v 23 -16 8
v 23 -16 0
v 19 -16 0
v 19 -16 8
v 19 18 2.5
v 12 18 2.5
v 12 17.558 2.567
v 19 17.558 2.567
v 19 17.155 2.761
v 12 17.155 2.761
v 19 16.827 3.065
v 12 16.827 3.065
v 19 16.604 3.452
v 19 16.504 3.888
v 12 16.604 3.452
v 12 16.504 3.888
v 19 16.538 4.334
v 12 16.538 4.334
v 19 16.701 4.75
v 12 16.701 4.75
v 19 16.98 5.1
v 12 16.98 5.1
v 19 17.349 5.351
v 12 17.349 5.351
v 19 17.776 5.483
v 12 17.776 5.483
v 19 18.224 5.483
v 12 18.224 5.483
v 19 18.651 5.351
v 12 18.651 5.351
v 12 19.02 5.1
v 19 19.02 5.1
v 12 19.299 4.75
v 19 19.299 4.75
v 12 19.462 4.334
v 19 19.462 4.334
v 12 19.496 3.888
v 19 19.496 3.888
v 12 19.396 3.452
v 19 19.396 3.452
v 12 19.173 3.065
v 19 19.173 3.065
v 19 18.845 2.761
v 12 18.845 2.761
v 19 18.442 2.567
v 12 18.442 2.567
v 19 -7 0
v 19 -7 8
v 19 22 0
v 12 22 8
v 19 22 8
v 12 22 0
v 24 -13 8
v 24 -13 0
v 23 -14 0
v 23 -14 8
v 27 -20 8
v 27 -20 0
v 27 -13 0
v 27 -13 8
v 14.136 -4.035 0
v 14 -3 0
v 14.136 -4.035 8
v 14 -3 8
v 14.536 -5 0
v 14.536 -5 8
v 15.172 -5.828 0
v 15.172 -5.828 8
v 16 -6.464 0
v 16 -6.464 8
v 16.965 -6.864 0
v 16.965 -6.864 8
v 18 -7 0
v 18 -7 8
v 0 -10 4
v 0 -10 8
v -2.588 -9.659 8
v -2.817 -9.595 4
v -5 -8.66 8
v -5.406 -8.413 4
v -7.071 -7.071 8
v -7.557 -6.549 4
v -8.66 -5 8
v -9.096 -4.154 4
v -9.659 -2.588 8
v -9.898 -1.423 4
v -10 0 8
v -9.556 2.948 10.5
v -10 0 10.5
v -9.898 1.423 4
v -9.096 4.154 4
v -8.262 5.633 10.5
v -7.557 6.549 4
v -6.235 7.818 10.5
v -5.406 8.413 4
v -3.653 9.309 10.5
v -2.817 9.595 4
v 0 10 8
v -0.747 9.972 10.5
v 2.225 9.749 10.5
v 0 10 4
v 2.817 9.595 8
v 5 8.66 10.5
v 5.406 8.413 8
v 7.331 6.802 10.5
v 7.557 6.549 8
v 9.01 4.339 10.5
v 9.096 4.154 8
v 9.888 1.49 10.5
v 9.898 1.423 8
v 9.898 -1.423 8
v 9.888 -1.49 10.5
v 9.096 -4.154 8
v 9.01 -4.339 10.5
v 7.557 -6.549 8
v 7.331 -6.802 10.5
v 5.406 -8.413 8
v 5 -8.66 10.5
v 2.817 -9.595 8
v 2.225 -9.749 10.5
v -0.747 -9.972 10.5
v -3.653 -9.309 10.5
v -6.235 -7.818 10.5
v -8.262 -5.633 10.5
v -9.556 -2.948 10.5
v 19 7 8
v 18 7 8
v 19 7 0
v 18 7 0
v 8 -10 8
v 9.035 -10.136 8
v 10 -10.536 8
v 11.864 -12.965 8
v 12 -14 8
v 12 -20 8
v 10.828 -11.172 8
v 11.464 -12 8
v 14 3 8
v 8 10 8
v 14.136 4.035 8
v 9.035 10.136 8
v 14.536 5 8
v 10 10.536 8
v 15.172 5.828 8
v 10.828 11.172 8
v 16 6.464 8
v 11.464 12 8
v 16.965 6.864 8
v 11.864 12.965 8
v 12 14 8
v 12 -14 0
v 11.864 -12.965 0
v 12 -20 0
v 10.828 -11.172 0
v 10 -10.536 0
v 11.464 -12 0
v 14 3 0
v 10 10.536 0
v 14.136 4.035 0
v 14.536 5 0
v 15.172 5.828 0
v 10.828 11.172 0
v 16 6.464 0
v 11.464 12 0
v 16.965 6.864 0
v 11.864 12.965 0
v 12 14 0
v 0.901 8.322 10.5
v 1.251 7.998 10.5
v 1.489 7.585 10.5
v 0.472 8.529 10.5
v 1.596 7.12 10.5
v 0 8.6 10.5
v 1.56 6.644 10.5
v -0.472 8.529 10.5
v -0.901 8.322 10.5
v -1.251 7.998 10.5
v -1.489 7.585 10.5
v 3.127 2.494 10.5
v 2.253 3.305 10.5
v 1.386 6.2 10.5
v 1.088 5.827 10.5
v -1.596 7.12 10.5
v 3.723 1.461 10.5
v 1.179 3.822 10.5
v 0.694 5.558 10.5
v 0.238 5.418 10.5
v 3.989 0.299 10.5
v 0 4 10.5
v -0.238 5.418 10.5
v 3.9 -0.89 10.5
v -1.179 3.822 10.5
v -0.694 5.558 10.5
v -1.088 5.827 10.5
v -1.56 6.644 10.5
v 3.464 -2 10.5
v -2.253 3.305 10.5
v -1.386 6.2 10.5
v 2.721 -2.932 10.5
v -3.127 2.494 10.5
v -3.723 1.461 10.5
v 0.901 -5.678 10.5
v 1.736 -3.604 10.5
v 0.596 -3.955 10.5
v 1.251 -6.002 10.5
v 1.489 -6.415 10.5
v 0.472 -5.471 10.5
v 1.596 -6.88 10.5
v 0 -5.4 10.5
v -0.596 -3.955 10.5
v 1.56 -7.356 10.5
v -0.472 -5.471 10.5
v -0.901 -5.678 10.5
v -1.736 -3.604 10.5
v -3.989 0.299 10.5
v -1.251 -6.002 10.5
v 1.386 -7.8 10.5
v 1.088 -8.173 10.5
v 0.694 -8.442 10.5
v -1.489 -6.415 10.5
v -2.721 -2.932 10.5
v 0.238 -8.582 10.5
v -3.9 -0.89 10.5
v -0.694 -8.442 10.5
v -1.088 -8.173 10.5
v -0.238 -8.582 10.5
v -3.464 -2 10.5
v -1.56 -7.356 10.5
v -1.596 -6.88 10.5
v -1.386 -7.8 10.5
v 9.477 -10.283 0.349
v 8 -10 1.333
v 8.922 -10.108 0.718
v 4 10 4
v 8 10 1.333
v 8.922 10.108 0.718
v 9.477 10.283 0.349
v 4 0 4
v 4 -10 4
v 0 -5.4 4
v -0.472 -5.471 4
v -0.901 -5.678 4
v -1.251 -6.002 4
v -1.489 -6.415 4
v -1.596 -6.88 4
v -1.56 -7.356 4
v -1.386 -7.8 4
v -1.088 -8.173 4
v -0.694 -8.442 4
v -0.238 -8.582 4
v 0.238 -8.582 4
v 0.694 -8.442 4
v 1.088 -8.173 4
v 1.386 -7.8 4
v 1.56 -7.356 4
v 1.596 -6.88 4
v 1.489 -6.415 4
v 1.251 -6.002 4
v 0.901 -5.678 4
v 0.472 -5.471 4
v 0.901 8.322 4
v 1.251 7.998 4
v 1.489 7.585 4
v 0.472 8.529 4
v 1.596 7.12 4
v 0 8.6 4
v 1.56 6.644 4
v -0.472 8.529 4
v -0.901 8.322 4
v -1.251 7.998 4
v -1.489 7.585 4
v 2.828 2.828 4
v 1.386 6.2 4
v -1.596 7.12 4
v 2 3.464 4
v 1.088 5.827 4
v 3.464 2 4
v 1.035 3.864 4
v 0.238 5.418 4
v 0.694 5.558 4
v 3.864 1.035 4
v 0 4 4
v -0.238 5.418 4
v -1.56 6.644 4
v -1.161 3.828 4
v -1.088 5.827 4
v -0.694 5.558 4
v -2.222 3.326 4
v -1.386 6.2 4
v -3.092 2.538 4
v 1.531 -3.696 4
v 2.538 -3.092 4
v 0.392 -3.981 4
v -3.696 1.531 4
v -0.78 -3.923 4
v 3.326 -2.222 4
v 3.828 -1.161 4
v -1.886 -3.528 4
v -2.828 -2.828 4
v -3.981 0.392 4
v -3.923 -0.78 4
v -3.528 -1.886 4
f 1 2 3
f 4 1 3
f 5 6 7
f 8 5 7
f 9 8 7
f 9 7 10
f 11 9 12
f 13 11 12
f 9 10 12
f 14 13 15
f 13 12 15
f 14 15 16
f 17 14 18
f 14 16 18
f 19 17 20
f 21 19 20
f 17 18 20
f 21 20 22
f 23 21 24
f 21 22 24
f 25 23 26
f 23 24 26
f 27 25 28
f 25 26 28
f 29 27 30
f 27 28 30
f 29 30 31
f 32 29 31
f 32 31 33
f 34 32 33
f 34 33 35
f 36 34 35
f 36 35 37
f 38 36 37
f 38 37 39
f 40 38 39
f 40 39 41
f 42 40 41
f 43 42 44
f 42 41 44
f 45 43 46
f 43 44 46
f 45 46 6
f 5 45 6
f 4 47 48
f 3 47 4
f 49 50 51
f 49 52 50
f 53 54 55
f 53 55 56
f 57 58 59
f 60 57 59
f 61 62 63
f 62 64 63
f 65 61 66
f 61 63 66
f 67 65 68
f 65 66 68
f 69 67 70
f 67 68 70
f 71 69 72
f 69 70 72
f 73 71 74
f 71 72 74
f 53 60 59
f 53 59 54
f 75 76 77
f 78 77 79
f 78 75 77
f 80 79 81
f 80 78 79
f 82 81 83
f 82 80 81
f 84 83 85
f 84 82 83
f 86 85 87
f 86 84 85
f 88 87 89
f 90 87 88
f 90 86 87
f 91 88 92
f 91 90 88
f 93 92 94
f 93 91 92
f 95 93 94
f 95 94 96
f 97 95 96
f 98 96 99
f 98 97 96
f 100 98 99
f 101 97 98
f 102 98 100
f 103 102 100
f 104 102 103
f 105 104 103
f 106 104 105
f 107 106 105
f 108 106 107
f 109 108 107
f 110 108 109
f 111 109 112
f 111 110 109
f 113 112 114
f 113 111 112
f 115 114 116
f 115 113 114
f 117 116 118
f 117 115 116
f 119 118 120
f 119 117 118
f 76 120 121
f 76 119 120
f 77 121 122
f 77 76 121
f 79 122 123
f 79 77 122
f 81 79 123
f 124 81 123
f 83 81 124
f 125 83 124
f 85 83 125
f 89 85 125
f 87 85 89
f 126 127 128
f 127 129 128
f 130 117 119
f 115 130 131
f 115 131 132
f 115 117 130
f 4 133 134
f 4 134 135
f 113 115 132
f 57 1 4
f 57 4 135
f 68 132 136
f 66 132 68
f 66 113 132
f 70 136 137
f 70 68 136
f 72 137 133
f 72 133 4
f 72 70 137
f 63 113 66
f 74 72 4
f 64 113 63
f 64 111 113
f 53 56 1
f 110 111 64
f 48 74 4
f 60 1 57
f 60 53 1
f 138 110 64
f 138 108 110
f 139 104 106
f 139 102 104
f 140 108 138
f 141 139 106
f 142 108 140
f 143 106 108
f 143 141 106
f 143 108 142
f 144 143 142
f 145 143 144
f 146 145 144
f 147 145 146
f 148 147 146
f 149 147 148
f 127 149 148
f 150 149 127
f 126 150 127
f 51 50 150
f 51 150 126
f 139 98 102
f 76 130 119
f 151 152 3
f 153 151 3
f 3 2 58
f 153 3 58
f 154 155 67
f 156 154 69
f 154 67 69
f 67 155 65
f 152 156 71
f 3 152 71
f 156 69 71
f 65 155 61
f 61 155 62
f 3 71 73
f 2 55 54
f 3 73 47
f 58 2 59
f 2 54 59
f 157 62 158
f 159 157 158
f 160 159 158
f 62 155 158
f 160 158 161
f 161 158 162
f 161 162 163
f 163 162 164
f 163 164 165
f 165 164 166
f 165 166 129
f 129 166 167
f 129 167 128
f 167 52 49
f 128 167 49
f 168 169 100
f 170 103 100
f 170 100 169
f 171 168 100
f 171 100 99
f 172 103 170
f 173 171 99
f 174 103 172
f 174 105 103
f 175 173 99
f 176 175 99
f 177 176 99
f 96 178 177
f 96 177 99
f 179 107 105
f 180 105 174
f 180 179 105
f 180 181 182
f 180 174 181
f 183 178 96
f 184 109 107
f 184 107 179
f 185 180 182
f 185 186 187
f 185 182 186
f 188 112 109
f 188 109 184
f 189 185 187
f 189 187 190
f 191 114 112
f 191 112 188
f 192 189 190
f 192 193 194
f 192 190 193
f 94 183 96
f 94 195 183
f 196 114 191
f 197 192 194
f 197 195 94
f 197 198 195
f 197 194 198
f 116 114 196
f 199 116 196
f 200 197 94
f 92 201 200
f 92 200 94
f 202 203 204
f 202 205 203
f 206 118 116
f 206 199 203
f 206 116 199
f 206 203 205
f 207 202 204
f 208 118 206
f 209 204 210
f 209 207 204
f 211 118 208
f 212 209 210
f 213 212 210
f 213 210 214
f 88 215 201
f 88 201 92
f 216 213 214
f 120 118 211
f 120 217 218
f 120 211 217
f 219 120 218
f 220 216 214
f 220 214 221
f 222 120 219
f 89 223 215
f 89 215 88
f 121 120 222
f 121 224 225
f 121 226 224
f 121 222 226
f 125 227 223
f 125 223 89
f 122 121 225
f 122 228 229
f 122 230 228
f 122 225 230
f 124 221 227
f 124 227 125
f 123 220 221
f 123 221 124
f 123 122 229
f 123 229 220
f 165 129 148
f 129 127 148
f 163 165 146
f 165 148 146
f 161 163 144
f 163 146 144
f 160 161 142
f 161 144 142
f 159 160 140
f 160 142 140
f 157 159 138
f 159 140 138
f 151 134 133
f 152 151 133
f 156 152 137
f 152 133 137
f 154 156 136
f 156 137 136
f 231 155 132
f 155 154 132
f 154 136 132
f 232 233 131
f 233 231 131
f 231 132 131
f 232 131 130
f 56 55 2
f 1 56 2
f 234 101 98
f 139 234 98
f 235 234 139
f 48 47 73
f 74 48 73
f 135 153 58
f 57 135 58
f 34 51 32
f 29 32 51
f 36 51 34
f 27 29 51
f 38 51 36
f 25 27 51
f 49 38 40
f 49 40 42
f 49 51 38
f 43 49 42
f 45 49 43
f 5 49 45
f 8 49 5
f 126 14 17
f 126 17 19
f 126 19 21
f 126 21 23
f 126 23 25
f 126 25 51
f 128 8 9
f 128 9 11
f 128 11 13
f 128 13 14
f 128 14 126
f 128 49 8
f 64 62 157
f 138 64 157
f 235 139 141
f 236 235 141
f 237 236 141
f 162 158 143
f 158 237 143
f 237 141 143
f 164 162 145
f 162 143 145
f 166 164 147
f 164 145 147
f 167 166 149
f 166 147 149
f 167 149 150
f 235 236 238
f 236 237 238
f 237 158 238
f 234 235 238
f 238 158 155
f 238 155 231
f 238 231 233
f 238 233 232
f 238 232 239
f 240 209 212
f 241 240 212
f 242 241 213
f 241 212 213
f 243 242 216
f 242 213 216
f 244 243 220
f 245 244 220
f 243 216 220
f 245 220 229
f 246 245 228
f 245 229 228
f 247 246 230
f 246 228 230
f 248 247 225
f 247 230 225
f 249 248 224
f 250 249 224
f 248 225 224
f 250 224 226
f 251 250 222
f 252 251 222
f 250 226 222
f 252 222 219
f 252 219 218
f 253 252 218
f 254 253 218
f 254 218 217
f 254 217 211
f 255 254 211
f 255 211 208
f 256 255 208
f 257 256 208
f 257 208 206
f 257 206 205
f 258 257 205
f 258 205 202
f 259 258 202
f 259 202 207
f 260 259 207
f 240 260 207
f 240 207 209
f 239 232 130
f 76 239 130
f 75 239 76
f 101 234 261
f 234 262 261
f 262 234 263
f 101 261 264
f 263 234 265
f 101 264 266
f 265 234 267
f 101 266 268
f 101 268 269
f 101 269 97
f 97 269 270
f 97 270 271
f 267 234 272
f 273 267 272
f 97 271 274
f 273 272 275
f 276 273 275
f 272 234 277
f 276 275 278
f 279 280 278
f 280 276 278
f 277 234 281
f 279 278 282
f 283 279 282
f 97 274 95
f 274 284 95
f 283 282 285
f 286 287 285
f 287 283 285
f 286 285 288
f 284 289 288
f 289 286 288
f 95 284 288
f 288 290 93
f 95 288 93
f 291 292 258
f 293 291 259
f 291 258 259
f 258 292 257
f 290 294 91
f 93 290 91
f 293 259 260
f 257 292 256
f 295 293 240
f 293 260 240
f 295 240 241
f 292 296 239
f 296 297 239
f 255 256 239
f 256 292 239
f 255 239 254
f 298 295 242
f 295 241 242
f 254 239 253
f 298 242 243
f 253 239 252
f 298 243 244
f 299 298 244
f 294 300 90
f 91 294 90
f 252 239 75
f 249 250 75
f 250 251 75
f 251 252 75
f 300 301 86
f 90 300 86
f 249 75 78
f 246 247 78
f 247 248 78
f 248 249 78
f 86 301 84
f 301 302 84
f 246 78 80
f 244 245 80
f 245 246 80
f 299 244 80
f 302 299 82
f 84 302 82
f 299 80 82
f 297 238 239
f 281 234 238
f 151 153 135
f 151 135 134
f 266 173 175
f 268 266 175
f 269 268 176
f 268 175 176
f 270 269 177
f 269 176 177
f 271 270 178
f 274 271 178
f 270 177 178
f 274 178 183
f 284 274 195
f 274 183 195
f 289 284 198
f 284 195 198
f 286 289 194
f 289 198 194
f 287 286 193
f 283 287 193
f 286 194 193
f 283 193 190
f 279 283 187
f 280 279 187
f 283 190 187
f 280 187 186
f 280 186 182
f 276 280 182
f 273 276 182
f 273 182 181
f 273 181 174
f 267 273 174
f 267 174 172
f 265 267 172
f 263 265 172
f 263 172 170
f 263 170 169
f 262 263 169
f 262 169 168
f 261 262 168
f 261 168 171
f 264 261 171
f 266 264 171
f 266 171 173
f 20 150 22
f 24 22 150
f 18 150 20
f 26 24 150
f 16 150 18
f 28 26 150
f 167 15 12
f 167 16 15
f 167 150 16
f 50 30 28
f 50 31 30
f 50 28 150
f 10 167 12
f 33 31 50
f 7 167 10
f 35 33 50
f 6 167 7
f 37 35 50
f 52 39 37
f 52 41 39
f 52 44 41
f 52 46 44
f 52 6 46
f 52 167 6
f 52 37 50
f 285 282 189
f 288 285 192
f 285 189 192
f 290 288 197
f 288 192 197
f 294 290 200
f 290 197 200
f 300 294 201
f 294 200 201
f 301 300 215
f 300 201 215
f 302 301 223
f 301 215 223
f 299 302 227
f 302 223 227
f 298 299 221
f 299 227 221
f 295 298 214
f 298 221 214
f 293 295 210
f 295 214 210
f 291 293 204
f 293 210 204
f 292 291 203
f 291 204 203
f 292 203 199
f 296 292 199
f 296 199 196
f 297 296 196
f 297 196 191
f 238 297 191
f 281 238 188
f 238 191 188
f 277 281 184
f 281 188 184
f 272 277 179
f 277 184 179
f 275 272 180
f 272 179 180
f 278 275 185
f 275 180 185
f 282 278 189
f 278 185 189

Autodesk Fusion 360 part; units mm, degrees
sketch "スケッチ1" plane through (0, 0, 0) normal (0, 0, 1) x (1, 0, 0)
  circle A0 centre (0, 0) radius 10
  line L0 (0, 10) -> (12, 10)
  line L1 (12, 10) -> (12, 22)
  line L2 (19, 22) -> (19, -16)
  line L3 (12, -20) -> (12, -10)
  line L4 (12, -10) -> (0, -10)
  line L5 (0, -7) -> (0, 7)
  line L6 (19, -7) -> (14, -7)
  line L7 (14, -7) -> (14, 7)
  line L8 (14, 7) -> (19, 7)
  line L9 (12, 22) -> (19, 22)
  line L10 (12, -20) -> (27, -20)
  line L11 (27, -20) -> (27, -13)
  line L12 (27, -13) -> (23, -13)
  line L13 (23, -13) -> (23, -16)
  line L14 (23, -16) -> (19, -16)
  point P0 (14, 0)
  dimension "d1" = 20
  dimension "d2" = 12
  dimension "d6" = 7
  dimension "d19" = 14
  dimension "d31" = 5
  dimension "d32" = 14
  dimension "d39" = 22
  dimension "d40" = 13
  dimension "d41" = 3
  dimension "d42" = 4
  dimension "d43" = 4
  dimension "d44" = 4
extrude "押し出し1" add sketch "スケッチ1" along normal blind 8 contours A0 | A0 L0 L1 L2 L3 L4 L6 L7 L8 L9 L10 L11 L12 L13 L14
sketch "スケッチ2" plane through (0, 0, 8) normal (0, 0, 1) x (-1, 0, 0)
  circle A0 centre (0, 0) radius 10
  line L0 (-12, 20) -> (-27, 20)
  line L1 (-27, 20) -> (-27, 13)
  line L2 (-27, 13) -> (-23, 13)
  line L3 (-23, 13) -> (-23, 16)
  line L4 (-23, 16) -> (-19, 16)
  line L5 (-19, 16) -> (-19, 7)
  line L6 (-19, -22) -> (-12, -22)
  line L7 (-12, -22) -> (-12, -10)
  line L8 (-12, -10) -> (0, -10)
  arc A1 (0, -10) -> (0, 10) centre (0, 0) ccw
  line L9 (0, 10) -> (-12, 10)
  line L10 (-12, 10) -> (-12, 20)
  line L11 (-19, 7) -> (-14, 7)
  line L12 (-14, 7) -> (-14, -7)
  line L13 (-14, -7) -> (-19, -7)
  line L14 (-19, -7) -> (-19, -22)
extrude "押し出し2" add sketch "スケッチ2" along normal blind 2.5 contours A0 A1
hole "穴1" at (0, 7, 0) at (0, -7, 0) direction (0, 0, 1) diameter 3.2 end through all
hole "穴3" at (0, 0, 0) direction (0, 0, 1) diameter 8 end through all
sketch "スケッチ3" plane through (0, -10, 0) normal (0, -1, 0) x (1, 0, 0)
  line L0 (0, 0) -> (12, 0)
  line L1 (12, 0) -> (12, 8)
  line L2 (12, 8) -> (0, 8)
  line L3 (0, 8) -> (0, 0)
  line L4 (10, 0) -> (4, 4)
  line L5 (4, 4) -> (-15, 4)
  line L6 (-15, 4) -> (-15, 0)
  line L7 (-15, 0) -> (10, 0)
  dimension "d20" = 10
  dimension "d21" = 15
  dimension "d22" = 6
  dimension "d23" = 4
extrude "押し出し3" cut sketch "スケッチ3" against normal through all contours L0 L3 L4 L5 L7 | L3 L5 L6 L7
sketch "スケッチ4" plane through (19, 0, 0) normal (1, 0, 0) x (0, 1, 0)
  line L0 (7, 0) -> (22, 0)
  line L1 (22, 8) -> (7, 8)
  line L2 (22, 4) -> (18, 4)
  line L3 (22, 0) -> (22, 8)
  line L4 (-16, 8) -> (-16, 0)
  line L5 (7, 8) -> (7, 0)
  line L6 (-16, 0) -> (-7, 0)
  line L7 (-7, 0) -> (-7, 8)
  line L8 (-7, 8) -> (-16, 8)
  dimension "d45" = 4
hole "穴2" at (19, 18, 4) direction (-1, 0, 0) diameter 3 depth 11 tip angle 118
thread "ねじ1"
fillet "フィレット1" radius 4 4 edges at (12, 10, 4) (12, -10, 4) (14, -7, 4) (14, 7, 4)
chamfer "面取り2" distance 1 angle 45 1 edges at (23, -13, 4)
